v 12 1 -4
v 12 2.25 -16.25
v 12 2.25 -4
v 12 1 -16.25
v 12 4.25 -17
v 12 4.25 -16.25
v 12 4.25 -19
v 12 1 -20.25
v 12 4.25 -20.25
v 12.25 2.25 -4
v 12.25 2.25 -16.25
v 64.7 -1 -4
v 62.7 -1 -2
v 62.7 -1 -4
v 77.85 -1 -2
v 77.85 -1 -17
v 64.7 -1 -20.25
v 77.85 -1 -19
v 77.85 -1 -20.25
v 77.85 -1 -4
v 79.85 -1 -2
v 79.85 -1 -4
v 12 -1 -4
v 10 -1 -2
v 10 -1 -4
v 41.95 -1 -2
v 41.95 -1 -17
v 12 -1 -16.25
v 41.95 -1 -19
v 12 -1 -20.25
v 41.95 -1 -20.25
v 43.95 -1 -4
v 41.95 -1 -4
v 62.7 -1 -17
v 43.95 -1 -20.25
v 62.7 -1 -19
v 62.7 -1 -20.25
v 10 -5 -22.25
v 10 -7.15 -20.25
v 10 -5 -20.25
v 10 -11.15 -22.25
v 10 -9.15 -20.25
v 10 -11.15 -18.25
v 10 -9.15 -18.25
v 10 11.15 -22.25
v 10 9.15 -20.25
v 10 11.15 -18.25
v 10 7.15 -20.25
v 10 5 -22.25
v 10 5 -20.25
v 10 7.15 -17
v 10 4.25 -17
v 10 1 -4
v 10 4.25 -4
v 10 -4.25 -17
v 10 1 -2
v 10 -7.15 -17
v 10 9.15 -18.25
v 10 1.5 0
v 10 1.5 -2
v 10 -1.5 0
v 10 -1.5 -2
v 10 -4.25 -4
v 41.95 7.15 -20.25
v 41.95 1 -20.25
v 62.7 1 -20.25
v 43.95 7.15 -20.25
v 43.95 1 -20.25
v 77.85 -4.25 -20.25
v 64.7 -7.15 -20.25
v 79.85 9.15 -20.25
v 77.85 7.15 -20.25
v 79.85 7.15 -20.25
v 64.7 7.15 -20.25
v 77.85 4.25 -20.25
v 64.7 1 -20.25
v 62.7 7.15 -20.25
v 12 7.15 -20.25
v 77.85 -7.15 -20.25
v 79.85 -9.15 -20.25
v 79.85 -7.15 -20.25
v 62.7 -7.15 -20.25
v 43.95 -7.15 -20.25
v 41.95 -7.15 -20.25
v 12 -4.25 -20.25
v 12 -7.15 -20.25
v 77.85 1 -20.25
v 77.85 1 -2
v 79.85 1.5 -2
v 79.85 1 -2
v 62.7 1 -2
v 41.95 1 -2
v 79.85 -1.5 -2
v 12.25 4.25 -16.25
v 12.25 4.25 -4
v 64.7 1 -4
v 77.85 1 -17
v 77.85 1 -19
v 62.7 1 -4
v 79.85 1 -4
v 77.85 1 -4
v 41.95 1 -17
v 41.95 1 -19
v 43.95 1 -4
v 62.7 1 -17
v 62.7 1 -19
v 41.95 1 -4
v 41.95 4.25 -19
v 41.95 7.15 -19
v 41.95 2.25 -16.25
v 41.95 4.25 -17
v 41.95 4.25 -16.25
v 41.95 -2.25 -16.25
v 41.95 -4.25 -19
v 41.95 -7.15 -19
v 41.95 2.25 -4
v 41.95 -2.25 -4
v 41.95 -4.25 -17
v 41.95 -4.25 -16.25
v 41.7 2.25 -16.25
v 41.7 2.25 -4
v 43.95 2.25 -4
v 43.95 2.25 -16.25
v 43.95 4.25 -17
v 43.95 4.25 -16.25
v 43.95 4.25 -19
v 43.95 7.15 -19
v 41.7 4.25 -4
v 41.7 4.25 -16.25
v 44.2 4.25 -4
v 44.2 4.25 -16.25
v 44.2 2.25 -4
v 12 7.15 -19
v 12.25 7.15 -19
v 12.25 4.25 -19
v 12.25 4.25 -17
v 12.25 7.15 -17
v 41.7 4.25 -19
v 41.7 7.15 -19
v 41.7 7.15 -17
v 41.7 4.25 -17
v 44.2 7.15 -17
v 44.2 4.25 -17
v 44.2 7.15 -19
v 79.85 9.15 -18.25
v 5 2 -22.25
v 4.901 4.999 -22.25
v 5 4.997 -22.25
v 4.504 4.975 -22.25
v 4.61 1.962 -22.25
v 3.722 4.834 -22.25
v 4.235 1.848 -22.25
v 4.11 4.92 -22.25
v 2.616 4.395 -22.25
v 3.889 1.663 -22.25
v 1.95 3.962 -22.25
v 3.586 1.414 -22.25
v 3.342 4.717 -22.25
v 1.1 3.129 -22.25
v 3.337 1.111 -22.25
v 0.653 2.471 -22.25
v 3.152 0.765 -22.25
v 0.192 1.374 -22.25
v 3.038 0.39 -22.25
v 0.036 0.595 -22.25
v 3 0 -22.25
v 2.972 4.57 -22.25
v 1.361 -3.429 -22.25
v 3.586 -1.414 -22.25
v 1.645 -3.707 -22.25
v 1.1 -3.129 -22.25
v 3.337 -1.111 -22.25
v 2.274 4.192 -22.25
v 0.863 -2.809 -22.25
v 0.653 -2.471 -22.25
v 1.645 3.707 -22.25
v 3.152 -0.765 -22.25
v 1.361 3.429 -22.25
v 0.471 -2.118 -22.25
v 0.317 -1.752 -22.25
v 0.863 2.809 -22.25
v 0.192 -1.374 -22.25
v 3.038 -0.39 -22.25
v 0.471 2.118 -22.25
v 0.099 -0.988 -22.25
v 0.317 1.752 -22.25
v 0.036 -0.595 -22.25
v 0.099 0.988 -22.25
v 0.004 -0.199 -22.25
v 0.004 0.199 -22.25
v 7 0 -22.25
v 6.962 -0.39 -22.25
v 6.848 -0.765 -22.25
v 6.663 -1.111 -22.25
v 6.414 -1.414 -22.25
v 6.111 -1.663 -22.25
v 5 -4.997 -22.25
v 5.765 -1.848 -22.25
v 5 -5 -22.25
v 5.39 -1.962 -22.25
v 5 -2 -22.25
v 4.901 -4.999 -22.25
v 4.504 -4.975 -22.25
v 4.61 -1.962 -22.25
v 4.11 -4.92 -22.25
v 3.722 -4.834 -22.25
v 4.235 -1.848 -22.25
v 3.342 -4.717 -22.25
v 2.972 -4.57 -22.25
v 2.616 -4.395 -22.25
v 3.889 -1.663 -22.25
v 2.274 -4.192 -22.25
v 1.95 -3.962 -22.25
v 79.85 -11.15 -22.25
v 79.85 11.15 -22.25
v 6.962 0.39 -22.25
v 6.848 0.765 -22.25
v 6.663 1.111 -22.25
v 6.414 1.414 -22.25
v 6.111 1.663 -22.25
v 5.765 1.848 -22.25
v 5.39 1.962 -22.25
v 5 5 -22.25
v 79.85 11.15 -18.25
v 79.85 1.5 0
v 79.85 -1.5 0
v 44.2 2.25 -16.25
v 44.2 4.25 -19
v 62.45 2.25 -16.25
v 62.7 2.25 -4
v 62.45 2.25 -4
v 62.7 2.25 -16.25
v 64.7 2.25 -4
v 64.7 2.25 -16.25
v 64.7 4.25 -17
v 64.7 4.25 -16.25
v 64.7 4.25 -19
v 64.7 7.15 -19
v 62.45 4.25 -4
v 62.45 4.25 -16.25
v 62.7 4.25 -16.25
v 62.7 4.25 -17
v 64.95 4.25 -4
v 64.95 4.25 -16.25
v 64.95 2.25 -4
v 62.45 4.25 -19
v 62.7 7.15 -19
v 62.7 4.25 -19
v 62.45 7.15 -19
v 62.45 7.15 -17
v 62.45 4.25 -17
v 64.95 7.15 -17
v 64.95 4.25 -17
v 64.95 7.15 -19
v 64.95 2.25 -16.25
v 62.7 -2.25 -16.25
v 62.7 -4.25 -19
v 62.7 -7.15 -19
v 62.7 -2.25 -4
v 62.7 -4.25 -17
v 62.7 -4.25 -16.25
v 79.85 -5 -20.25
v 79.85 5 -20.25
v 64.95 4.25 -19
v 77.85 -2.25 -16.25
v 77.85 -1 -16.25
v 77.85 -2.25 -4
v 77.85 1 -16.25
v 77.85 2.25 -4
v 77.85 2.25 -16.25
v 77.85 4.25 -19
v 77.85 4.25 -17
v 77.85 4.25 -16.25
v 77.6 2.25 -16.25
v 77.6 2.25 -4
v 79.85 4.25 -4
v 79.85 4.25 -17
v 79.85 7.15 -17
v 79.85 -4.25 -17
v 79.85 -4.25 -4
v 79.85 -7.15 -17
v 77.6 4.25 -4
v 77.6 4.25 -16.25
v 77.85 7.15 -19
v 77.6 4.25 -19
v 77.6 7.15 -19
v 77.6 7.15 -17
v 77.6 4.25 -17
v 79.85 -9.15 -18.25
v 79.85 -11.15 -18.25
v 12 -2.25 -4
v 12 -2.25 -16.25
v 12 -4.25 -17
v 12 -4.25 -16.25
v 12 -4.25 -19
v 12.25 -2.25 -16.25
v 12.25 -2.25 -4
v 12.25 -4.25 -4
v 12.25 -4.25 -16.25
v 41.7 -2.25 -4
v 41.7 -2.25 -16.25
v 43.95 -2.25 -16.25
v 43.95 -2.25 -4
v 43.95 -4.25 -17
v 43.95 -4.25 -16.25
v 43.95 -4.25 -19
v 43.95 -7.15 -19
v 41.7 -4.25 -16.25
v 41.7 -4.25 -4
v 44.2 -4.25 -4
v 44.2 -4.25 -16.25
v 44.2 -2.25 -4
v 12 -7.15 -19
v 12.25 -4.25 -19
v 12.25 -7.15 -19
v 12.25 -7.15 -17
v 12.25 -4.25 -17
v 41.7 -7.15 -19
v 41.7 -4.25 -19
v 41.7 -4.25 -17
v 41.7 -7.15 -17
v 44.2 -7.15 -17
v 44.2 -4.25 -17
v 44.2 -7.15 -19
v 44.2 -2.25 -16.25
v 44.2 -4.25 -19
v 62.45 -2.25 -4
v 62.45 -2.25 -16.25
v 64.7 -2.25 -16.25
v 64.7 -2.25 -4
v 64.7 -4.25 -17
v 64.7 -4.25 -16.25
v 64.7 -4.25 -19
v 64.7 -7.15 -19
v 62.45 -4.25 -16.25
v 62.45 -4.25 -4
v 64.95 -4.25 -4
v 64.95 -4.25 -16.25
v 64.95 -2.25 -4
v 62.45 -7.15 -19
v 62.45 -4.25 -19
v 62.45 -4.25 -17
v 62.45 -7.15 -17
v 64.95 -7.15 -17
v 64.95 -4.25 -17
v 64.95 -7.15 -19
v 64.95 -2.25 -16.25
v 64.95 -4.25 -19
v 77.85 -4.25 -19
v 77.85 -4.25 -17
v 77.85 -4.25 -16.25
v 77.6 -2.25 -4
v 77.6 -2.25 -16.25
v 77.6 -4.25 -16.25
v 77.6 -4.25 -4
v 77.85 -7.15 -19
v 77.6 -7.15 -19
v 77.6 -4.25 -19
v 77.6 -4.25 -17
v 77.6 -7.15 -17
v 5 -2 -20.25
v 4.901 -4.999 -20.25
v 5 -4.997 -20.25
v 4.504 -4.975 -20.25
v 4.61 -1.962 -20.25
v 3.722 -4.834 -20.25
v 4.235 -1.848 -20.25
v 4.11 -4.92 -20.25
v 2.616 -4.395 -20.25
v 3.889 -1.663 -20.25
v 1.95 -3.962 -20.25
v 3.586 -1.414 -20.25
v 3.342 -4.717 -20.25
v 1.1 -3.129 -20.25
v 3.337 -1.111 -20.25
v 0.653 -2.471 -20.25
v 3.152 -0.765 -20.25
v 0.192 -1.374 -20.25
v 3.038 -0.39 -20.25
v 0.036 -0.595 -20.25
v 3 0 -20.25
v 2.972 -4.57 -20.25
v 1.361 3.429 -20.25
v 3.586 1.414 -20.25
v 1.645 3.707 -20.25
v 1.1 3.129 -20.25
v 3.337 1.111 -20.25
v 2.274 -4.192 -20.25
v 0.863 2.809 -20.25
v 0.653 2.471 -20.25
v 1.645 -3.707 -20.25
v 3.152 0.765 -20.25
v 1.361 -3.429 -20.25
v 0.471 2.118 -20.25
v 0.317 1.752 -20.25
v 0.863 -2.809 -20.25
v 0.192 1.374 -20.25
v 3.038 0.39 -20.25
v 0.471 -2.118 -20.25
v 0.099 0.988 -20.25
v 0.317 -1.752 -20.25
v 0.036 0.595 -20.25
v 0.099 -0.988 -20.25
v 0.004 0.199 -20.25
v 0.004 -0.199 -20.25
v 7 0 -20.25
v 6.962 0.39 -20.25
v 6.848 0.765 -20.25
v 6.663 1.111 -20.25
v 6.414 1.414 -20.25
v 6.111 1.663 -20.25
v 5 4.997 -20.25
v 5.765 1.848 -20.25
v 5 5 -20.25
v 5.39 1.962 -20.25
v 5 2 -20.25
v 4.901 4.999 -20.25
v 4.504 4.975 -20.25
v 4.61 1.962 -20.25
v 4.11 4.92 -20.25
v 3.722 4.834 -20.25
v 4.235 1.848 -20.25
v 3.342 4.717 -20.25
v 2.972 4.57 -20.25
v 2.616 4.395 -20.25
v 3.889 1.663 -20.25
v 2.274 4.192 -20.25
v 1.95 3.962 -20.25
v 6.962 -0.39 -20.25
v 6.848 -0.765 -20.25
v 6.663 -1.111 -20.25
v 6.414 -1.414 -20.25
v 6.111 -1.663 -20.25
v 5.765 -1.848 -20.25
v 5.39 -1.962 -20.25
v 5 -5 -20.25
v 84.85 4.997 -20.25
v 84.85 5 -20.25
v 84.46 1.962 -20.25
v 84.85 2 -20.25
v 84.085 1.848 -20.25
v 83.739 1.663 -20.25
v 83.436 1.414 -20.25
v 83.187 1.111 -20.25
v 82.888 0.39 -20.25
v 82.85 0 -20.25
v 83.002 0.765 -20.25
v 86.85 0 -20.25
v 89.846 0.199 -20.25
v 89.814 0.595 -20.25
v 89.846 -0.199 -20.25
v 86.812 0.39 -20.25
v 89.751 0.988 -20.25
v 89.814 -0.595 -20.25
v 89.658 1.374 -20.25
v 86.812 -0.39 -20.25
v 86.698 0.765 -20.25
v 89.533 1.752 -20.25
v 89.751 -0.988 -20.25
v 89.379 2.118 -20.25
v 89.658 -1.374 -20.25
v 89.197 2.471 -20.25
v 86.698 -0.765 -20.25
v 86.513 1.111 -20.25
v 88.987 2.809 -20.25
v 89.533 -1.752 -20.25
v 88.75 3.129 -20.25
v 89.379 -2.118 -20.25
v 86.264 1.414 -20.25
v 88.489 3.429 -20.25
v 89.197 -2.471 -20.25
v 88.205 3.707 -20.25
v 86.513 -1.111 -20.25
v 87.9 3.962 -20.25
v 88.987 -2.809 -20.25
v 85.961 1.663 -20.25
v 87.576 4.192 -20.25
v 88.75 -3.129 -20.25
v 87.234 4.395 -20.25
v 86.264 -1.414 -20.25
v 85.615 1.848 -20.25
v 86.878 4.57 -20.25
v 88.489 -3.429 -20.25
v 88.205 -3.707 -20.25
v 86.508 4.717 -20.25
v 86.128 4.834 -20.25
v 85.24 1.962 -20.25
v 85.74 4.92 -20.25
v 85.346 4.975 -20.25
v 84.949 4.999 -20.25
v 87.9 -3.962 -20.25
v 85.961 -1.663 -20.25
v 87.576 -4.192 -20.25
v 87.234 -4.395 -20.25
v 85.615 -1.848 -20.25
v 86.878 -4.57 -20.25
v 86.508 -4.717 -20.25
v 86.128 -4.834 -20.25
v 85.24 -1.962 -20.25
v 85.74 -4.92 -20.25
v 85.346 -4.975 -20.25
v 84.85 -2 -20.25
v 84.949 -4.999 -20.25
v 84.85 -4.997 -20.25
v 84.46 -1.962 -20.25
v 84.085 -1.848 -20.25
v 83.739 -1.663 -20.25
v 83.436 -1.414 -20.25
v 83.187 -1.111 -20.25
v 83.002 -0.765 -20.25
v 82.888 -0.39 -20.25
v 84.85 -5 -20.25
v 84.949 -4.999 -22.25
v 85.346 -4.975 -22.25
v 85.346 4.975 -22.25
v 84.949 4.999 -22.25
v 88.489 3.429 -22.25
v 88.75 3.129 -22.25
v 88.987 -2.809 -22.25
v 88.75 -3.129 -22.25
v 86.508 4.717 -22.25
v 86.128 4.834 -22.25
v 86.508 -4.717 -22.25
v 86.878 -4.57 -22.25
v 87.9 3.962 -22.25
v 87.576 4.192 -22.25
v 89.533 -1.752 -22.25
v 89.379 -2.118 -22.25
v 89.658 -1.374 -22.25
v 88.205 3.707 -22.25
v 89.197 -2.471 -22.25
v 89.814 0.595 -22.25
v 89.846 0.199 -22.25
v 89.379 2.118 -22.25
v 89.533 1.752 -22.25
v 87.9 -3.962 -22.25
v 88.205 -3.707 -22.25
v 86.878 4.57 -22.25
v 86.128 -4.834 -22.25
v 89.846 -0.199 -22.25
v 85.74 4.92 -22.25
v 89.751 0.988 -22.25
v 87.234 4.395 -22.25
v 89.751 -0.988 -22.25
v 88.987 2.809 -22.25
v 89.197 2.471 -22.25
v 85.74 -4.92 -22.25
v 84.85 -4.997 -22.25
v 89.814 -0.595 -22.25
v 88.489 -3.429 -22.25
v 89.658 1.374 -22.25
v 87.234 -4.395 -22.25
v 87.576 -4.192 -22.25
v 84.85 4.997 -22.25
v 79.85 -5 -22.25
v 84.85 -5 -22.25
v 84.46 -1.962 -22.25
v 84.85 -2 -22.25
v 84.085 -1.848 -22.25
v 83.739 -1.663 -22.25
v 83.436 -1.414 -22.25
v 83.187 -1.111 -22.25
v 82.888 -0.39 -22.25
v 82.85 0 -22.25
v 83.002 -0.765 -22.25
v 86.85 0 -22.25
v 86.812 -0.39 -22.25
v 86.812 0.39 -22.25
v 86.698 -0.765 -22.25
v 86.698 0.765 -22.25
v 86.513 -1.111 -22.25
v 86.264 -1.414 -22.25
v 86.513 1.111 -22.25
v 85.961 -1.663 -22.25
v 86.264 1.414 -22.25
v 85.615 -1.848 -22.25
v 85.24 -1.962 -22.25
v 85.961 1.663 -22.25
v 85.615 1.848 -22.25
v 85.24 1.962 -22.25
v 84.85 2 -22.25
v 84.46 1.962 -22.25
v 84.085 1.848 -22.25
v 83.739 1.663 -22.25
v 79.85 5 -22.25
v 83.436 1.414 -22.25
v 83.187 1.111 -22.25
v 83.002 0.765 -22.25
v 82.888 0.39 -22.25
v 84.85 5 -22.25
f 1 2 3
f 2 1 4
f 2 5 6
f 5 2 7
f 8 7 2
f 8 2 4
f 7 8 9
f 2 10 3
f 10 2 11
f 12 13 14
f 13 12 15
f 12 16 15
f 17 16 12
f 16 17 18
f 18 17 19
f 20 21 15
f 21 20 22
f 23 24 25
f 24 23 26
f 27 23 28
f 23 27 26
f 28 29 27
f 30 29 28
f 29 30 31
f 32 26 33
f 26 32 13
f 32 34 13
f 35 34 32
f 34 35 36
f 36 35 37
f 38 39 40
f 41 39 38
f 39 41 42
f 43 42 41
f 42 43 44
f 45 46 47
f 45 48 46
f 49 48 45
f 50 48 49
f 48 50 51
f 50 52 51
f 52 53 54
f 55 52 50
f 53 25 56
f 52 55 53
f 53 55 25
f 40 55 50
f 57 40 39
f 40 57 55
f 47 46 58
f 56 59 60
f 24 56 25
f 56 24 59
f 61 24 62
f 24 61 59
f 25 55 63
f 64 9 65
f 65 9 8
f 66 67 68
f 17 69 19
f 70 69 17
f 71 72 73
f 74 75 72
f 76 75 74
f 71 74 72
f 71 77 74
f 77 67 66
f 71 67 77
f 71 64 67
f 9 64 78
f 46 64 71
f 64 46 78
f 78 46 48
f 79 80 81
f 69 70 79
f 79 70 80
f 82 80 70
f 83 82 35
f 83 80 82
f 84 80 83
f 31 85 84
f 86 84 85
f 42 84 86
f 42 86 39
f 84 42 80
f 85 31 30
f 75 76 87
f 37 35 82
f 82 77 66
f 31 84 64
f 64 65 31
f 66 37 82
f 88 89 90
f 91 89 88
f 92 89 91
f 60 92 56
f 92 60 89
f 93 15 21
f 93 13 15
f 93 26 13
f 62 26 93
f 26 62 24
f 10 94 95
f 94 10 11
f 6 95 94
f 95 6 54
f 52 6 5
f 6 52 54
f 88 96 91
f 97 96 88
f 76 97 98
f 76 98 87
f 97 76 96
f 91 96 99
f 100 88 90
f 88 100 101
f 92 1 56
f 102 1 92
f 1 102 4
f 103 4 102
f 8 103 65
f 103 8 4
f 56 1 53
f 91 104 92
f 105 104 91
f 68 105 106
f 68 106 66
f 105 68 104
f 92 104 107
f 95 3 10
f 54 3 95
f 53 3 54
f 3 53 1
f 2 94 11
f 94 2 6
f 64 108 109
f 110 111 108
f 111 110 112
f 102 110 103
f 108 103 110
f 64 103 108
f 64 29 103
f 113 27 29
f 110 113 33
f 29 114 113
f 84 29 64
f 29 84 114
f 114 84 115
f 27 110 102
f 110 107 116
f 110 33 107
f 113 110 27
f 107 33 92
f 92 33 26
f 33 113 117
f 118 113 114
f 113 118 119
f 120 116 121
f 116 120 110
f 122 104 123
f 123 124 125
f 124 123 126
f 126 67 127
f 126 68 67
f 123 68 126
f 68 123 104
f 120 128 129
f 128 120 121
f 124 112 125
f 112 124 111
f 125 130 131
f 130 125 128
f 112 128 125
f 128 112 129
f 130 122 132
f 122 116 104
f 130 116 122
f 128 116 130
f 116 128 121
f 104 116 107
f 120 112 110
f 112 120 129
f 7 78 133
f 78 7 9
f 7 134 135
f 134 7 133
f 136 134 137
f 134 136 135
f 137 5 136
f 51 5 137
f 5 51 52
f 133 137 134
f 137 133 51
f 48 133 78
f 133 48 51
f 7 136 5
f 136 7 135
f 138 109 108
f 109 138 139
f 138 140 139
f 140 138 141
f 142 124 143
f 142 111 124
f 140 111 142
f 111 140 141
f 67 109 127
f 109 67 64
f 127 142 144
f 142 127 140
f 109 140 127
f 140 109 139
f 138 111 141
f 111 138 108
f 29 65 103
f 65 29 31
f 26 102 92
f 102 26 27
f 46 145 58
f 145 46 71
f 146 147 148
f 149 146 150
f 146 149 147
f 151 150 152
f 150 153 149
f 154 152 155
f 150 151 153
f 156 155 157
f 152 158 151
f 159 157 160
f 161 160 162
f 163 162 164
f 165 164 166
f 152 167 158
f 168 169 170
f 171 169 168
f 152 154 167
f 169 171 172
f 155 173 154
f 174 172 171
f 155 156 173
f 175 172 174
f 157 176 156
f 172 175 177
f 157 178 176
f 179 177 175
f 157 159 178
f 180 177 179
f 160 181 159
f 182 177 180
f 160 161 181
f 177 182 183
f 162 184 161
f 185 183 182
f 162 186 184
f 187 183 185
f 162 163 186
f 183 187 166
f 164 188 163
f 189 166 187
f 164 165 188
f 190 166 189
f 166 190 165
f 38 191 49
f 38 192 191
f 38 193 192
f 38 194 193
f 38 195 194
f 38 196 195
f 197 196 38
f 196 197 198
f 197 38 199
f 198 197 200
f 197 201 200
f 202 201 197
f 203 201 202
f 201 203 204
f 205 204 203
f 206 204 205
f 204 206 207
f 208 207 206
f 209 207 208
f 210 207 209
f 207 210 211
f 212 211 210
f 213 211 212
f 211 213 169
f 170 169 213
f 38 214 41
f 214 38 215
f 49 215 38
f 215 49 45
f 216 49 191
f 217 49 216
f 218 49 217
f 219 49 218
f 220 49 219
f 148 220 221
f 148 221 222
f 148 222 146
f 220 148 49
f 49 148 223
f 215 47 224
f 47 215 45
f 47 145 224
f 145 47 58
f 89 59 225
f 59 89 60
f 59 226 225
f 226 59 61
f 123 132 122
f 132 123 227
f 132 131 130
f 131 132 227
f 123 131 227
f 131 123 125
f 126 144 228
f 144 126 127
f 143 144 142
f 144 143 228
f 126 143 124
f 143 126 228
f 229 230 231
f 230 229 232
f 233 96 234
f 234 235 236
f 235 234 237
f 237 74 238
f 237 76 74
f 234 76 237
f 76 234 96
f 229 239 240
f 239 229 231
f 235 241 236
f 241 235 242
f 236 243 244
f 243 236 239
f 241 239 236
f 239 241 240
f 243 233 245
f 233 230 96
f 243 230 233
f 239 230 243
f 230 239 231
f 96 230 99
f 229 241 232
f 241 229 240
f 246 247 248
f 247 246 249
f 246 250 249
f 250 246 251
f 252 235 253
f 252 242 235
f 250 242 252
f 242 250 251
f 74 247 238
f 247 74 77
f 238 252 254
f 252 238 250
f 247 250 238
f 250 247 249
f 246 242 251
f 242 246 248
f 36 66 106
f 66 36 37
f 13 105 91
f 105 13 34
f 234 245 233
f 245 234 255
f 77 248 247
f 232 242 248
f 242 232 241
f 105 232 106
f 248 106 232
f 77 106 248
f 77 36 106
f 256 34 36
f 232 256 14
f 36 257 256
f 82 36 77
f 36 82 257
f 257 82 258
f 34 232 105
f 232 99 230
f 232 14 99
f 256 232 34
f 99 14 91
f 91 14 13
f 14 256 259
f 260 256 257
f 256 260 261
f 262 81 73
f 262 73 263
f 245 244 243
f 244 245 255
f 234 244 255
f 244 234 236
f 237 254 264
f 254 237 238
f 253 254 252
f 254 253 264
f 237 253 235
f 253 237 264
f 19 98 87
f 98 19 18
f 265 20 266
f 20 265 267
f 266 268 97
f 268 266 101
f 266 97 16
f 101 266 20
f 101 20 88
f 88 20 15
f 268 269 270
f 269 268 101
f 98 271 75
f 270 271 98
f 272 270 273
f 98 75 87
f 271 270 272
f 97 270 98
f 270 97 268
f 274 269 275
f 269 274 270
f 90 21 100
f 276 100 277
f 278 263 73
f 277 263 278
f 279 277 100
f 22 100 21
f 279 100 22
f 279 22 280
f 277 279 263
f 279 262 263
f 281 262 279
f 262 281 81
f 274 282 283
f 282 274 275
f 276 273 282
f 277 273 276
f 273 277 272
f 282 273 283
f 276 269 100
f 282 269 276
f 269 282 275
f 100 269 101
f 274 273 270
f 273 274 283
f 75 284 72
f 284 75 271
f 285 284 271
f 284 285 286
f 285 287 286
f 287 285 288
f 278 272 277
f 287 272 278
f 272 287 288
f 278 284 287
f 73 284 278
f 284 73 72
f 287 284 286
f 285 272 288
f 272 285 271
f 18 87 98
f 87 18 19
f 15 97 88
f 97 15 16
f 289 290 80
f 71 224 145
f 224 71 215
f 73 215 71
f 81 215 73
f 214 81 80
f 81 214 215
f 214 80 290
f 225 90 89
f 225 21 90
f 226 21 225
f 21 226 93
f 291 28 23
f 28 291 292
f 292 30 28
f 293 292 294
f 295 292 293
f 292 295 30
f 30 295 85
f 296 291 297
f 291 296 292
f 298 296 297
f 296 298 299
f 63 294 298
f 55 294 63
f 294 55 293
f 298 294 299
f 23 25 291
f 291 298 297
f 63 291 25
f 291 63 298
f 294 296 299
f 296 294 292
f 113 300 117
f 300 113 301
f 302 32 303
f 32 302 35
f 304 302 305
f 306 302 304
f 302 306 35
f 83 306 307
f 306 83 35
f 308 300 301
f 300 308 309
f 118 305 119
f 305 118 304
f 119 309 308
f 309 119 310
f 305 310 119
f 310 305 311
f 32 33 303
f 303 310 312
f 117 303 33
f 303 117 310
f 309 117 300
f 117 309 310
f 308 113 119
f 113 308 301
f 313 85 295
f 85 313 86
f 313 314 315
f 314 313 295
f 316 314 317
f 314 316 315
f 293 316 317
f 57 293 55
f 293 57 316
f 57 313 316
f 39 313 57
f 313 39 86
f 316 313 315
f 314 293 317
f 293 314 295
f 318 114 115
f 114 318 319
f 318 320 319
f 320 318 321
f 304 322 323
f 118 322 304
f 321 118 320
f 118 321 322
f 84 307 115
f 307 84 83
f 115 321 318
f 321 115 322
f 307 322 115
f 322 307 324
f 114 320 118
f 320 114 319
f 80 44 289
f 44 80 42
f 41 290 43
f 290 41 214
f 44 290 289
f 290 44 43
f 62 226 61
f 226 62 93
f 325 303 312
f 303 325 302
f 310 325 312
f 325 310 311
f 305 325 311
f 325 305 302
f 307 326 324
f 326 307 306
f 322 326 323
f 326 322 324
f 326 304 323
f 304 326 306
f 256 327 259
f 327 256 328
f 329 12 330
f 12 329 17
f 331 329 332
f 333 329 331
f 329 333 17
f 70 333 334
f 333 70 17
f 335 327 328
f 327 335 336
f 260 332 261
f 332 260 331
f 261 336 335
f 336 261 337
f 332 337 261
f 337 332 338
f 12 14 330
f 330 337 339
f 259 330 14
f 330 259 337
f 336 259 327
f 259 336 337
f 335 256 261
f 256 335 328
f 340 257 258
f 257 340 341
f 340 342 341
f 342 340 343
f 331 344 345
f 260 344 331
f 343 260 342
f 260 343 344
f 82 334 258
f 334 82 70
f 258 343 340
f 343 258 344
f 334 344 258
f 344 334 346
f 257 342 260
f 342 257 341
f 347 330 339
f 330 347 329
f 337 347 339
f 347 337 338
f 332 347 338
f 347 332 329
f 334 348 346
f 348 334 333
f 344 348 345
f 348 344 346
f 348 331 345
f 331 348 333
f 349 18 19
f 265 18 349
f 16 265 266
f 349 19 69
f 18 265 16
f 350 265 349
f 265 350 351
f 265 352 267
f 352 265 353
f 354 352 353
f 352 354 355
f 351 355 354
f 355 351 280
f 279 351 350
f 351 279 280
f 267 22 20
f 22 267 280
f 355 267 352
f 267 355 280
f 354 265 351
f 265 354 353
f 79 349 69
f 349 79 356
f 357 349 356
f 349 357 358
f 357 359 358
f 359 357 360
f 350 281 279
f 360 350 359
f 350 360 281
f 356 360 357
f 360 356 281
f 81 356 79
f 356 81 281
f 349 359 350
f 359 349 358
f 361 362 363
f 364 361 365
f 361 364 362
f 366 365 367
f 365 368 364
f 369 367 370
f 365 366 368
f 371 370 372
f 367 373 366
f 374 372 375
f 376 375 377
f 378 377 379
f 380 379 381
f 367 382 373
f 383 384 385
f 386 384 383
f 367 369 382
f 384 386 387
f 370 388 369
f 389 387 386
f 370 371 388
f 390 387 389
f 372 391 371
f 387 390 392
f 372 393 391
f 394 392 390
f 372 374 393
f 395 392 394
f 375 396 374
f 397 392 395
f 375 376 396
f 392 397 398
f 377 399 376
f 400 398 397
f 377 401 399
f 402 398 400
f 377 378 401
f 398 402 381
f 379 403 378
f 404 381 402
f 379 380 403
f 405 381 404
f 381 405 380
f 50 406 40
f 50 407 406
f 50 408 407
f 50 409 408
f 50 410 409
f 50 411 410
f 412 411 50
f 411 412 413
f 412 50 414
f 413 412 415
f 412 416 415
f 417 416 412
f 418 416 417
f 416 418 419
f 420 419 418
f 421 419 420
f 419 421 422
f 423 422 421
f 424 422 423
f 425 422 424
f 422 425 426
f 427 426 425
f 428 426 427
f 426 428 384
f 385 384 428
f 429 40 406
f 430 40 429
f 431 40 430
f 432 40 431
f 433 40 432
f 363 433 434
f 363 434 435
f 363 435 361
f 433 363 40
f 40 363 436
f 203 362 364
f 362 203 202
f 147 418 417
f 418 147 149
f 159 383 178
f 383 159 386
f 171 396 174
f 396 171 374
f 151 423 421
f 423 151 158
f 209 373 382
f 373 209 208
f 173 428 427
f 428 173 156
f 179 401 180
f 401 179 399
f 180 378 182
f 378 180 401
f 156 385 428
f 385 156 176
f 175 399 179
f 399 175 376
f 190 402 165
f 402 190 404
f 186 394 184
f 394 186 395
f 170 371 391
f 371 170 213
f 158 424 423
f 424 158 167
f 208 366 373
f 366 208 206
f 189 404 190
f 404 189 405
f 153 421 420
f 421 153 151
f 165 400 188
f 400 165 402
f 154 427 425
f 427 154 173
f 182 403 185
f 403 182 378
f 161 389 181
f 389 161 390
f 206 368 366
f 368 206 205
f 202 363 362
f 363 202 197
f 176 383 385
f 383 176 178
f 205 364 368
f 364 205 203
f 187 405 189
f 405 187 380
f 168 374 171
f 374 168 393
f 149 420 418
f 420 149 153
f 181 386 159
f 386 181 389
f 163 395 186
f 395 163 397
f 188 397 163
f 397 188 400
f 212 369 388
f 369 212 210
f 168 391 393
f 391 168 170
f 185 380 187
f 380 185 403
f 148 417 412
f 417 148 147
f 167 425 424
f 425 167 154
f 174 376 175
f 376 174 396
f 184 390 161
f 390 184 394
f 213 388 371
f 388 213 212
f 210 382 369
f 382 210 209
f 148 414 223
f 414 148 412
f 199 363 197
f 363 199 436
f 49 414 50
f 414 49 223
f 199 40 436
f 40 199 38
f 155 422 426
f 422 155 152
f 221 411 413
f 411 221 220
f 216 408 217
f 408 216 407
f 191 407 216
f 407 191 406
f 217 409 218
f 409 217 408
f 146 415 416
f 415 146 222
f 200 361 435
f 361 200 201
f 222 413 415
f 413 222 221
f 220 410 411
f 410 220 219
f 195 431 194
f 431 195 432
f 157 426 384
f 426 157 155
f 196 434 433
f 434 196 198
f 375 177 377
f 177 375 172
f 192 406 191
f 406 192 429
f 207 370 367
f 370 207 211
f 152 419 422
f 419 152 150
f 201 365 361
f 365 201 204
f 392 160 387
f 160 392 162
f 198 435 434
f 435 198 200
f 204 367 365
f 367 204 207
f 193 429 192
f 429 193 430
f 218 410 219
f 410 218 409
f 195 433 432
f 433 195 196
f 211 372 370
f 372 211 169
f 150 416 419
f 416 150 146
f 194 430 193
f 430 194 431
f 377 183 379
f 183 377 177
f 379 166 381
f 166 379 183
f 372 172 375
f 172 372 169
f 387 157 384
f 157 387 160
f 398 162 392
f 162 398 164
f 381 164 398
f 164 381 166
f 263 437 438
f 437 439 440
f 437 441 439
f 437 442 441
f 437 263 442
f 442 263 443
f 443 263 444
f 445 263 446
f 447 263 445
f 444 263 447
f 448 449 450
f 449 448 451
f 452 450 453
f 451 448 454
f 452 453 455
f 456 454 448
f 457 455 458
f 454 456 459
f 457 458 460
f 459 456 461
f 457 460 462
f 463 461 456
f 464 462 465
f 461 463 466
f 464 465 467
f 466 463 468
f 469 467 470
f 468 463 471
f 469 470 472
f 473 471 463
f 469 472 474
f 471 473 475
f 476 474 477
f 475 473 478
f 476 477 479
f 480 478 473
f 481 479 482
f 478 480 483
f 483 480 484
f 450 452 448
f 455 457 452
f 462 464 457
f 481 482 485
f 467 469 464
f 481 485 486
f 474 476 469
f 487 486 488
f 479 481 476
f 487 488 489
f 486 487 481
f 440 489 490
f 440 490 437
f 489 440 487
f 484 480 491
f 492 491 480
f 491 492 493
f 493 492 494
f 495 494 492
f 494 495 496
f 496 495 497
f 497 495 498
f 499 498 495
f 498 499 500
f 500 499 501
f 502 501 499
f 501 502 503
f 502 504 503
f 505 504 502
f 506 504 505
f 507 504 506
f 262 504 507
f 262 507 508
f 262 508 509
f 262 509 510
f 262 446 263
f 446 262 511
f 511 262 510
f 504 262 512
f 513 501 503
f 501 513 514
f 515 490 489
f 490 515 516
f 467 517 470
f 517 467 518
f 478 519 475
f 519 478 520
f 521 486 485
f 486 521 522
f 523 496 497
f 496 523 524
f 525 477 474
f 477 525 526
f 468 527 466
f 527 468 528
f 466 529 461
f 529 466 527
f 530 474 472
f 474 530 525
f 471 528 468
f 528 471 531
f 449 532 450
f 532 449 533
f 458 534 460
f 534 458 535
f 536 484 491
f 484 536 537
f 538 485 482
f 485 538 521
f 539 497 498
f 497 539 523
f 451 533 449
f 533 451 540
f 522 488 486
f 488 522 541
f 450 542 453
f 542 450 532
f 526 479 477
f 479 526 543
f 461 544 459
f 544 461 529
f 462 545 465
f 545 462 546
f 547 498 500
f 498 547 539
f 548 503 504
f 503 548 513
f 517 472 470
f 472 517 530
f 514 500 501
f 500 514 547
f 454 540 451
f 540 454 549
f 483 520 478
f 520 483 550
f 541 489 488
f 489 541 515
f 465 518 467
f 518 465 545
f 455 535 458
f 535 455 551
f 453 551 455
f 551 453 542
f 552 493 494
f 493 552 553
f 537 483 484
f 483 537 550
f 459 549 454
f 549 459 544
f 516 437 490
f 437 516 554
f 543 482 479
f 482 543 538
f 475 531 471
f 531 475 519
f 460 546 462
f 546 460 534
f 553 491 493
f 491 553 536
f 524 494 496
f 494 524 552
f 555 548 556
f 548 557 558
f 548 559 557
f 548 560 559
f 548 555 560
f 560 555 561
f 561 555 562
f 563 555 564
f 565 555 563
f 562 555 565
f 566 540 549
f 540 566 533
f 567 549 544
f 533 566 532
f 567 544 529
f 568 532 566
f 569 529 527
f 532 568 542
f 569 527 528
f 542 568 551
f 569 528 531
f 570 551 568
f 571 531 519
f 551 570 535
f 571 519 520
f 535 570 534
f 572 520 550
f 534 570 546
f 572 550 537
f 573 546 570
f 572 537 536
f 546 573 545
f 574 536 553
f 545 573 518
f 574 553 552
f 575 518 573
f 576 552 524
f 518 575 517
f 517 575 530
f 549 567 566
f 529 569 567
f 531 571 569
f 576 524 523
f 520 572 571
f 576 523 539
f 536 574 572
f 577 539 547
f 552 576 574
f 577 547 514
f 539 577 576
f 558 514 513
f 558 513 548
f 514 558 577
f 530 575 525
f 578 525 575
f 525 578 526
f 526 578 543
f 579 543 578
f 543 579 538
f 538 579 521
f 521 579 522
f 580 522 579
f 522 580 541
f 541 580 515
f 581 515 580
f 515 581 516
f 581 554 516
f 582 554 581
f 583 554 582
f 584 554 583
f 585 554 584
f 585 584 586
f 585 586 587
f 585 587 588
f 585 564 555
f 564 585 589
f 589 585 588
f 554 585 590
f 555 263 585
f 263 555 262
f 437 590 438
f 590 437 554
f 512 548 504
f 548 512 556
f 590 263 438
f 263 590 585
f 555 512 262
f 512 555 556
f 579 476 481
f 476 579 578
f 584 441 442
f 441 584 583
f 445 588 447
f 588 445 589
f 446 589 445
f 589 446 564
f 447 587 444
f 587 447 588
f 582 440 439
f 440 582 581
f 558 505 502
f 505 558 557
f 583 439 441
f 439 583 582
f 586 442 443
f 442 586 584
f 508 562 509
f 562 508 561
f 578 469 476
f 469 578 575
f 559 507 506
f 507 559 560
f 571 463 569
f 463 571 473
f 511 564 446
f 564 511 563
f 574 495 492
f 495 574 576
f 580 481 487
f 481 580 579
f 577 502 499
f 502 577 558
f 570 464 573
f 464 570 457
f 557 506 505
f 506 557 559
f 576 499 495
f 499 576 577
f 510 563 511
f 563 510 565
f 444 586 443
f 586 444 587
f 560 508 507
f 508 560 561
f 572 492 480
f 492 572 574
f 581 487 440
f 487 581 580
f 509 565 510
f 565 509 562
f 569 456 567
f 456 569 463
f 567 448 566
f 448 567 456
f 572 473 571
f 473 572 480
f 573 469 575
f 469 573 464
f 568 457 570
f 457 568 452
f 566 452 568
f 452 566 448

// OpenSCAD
// ////////////////////////////////////////////////
//
// WAGO 221 mount
//
// Creates a single row or double row set of 221 blocks
// with mounting tabs/ears at either end.
//
// Created - 2017/01/01 by Joo Chung
//
// ////////////////////////////////////////////////

// ////////////////////////////////////////////////
// vector of blocks. each element specifies the number of connectors for that block
// EDIT THIS
blocks = [5,3,2]; // two 5 connector blocks 
// blocks = [5, 3, 2]; // a set of 5 connector, 3 connector, 2 connector blocks
// blocks = [5, 5, 5]; // a set of three 5 connector blocks
// blocks = [2]; // a single 2 connector block
// blocks = [3]; // a single 3 connector block


// ////////////////////////////////////////////////
// Mirror the mount, stand it up, and put tabs on bottom.
// 0 - no mirror, 1 - mirror, rotate so its standing up, and reposition tabs
// EDIT THIS
mirror = 1;

// ////////////////////////////////////////////////
// Tabs - include or exclude mounting tabs
// 0 - no tabs, 1 - tabs
// EDIT THIS
tabs = 1;


// ////////////////////////////////////////////////
// Block dimensions in mm -- DO NOT EDIT
conwidth = 5.6; // width of a single connection
border = 1.75; // block transparent plastic border
blockdepth = 18.25;
fudge = 0.2;

tabwidth = 10;

// ////////////////////////////////////////////////
// OpenSCAD special variables -- DO NOT EDIT
$fa = 1;
$fs = 0.4;

// ////////////////////////////////////////////////
// Functions
function bw(x) = conwidth*x+border+fudge;
function mw(i, n) = ( i==0 ? bw(blocks[i]) + 2 + mw(i+1, n) : (i < n ? bw(blocks[i]) + 2 + mw(i+1, n) : 0));


// ////////////////////////////////////////////////
// Modules
module tab(width, hole, thickness) {
    difference() {
        union () {
            cylinder(thickness,width/2,width/2, true);
            translate([width/4,0,0]) cube([width/2,width,thickness], true);
        }
    cylinder(width,hole,hole, true);
    }
}

module shoulder (depth) {
    difference () {
        union () {
            cube([2, blockdepth, 3.25], false);
            translate([0,0,3.25]) cube([2.25, blockdepth, 2], false);
        }
        translate([0,0,2]) cube([2.25,2,3.25], false);
        translate([2,blockdepth-4,2]) cube([0.25,4,3.25], false);
    }
}


module backshoulder (height) {
    difference() {
        union() {  
            translate([0, 2, 0]) cube ([2, 1.25, 10.15]);
            cube ([2.25, 2, 10.15]);
        }
        translate([0,0,10.15-2]) cube([2.25,3.25,2]);
        translate([2,0,2]) cube([1.25,3.25,3.25]);
    }
}



// WAGO 221 block
module block (nconn) {
    blockwidth = bw(nconn);

    // base
    translate([2,2,0]) cube([blockwidth, blockdepth, 2], false);
    
    // back headboard
    translate([0,blockdepth+2,0]) cube([blockwidth+4, 2, 10.15], false);

    // back lip
    translate([0,blockdepth,10.15]) cube([blockwidth+4, 4, 2], false);
    
    // front lip
    translate([0,0,0]) cube([blockwidth+4, 2, 2.5], false);

    // left shoulder and right shoulders
    translate([0,2,0]) shoulder();
    translate([blockwidth+4,2,0]) mirror() shoulder(); 
    
    // back left and shoulder
    translate([0, blockdepth-1.25, 0]) backshoulder(); 
    translate([blockwidth+4, blockdepth -1.25, 0]) mirror() backshoulder();
    
}



// ////////////////////////////////////////////////
// MAIN BODY

mountwidth=mw(0, len(blocks));
if (mirror==0) { // No mirror. Single row of blocks
    // create array of blocks
    for (i=[0:len(blocks)-1]) {
        offset = (i==0) ? tabwidth : tabwidth + mw(0, i);
        translate([offset, 0, 0]) block(blocks[i]);
    }
    
    // left and right tabs
    if (tabs==1) {
        translate([tabwidth/2,(blockdepth+4)/2,1]) tab (tabwidth, 2, 2);
        translate([mountwidth+2+tabwidth+tabwidth/2,(blockdepth+4)/2,1]) mirror() tab (tabwidth, 2, 2);
    }
} else { // Mirrored. two rows of blocks, back to back.
    // Row #1. Stand up on headboard.
    rotate([-90,0,0]) for (i=[0:len(blocks)-1]) {
        offset = (i==0) ? tabwidth : tabwidth + mw(0, i);
        translate([offset, 0, -1]) block(blocks[i]);
    }
    
    // Row #2. Opposite rotation. Stand up on headbord
    rotate([90,0,0]) mirror ([0, 1, 0]) for (i=[0:len(blocks)-1]) {
        offset = (i==0) ? tabwidth : tabwidth + mw(0, i);
        translate([offset, 0, -1]) block(blocks[i]);
    }   
    
    // left and right tabs
    if (tabs==1) {
        translate([tabwidth/2,0,-blockdepth-3]) tab (tabwidth, 2, 2);
        translate([mountwidth+2+tabwidth+tabwidth/2,0,-blockdepth-3]) mirror() tab (tabwidth, 2, 2);
    }
}
